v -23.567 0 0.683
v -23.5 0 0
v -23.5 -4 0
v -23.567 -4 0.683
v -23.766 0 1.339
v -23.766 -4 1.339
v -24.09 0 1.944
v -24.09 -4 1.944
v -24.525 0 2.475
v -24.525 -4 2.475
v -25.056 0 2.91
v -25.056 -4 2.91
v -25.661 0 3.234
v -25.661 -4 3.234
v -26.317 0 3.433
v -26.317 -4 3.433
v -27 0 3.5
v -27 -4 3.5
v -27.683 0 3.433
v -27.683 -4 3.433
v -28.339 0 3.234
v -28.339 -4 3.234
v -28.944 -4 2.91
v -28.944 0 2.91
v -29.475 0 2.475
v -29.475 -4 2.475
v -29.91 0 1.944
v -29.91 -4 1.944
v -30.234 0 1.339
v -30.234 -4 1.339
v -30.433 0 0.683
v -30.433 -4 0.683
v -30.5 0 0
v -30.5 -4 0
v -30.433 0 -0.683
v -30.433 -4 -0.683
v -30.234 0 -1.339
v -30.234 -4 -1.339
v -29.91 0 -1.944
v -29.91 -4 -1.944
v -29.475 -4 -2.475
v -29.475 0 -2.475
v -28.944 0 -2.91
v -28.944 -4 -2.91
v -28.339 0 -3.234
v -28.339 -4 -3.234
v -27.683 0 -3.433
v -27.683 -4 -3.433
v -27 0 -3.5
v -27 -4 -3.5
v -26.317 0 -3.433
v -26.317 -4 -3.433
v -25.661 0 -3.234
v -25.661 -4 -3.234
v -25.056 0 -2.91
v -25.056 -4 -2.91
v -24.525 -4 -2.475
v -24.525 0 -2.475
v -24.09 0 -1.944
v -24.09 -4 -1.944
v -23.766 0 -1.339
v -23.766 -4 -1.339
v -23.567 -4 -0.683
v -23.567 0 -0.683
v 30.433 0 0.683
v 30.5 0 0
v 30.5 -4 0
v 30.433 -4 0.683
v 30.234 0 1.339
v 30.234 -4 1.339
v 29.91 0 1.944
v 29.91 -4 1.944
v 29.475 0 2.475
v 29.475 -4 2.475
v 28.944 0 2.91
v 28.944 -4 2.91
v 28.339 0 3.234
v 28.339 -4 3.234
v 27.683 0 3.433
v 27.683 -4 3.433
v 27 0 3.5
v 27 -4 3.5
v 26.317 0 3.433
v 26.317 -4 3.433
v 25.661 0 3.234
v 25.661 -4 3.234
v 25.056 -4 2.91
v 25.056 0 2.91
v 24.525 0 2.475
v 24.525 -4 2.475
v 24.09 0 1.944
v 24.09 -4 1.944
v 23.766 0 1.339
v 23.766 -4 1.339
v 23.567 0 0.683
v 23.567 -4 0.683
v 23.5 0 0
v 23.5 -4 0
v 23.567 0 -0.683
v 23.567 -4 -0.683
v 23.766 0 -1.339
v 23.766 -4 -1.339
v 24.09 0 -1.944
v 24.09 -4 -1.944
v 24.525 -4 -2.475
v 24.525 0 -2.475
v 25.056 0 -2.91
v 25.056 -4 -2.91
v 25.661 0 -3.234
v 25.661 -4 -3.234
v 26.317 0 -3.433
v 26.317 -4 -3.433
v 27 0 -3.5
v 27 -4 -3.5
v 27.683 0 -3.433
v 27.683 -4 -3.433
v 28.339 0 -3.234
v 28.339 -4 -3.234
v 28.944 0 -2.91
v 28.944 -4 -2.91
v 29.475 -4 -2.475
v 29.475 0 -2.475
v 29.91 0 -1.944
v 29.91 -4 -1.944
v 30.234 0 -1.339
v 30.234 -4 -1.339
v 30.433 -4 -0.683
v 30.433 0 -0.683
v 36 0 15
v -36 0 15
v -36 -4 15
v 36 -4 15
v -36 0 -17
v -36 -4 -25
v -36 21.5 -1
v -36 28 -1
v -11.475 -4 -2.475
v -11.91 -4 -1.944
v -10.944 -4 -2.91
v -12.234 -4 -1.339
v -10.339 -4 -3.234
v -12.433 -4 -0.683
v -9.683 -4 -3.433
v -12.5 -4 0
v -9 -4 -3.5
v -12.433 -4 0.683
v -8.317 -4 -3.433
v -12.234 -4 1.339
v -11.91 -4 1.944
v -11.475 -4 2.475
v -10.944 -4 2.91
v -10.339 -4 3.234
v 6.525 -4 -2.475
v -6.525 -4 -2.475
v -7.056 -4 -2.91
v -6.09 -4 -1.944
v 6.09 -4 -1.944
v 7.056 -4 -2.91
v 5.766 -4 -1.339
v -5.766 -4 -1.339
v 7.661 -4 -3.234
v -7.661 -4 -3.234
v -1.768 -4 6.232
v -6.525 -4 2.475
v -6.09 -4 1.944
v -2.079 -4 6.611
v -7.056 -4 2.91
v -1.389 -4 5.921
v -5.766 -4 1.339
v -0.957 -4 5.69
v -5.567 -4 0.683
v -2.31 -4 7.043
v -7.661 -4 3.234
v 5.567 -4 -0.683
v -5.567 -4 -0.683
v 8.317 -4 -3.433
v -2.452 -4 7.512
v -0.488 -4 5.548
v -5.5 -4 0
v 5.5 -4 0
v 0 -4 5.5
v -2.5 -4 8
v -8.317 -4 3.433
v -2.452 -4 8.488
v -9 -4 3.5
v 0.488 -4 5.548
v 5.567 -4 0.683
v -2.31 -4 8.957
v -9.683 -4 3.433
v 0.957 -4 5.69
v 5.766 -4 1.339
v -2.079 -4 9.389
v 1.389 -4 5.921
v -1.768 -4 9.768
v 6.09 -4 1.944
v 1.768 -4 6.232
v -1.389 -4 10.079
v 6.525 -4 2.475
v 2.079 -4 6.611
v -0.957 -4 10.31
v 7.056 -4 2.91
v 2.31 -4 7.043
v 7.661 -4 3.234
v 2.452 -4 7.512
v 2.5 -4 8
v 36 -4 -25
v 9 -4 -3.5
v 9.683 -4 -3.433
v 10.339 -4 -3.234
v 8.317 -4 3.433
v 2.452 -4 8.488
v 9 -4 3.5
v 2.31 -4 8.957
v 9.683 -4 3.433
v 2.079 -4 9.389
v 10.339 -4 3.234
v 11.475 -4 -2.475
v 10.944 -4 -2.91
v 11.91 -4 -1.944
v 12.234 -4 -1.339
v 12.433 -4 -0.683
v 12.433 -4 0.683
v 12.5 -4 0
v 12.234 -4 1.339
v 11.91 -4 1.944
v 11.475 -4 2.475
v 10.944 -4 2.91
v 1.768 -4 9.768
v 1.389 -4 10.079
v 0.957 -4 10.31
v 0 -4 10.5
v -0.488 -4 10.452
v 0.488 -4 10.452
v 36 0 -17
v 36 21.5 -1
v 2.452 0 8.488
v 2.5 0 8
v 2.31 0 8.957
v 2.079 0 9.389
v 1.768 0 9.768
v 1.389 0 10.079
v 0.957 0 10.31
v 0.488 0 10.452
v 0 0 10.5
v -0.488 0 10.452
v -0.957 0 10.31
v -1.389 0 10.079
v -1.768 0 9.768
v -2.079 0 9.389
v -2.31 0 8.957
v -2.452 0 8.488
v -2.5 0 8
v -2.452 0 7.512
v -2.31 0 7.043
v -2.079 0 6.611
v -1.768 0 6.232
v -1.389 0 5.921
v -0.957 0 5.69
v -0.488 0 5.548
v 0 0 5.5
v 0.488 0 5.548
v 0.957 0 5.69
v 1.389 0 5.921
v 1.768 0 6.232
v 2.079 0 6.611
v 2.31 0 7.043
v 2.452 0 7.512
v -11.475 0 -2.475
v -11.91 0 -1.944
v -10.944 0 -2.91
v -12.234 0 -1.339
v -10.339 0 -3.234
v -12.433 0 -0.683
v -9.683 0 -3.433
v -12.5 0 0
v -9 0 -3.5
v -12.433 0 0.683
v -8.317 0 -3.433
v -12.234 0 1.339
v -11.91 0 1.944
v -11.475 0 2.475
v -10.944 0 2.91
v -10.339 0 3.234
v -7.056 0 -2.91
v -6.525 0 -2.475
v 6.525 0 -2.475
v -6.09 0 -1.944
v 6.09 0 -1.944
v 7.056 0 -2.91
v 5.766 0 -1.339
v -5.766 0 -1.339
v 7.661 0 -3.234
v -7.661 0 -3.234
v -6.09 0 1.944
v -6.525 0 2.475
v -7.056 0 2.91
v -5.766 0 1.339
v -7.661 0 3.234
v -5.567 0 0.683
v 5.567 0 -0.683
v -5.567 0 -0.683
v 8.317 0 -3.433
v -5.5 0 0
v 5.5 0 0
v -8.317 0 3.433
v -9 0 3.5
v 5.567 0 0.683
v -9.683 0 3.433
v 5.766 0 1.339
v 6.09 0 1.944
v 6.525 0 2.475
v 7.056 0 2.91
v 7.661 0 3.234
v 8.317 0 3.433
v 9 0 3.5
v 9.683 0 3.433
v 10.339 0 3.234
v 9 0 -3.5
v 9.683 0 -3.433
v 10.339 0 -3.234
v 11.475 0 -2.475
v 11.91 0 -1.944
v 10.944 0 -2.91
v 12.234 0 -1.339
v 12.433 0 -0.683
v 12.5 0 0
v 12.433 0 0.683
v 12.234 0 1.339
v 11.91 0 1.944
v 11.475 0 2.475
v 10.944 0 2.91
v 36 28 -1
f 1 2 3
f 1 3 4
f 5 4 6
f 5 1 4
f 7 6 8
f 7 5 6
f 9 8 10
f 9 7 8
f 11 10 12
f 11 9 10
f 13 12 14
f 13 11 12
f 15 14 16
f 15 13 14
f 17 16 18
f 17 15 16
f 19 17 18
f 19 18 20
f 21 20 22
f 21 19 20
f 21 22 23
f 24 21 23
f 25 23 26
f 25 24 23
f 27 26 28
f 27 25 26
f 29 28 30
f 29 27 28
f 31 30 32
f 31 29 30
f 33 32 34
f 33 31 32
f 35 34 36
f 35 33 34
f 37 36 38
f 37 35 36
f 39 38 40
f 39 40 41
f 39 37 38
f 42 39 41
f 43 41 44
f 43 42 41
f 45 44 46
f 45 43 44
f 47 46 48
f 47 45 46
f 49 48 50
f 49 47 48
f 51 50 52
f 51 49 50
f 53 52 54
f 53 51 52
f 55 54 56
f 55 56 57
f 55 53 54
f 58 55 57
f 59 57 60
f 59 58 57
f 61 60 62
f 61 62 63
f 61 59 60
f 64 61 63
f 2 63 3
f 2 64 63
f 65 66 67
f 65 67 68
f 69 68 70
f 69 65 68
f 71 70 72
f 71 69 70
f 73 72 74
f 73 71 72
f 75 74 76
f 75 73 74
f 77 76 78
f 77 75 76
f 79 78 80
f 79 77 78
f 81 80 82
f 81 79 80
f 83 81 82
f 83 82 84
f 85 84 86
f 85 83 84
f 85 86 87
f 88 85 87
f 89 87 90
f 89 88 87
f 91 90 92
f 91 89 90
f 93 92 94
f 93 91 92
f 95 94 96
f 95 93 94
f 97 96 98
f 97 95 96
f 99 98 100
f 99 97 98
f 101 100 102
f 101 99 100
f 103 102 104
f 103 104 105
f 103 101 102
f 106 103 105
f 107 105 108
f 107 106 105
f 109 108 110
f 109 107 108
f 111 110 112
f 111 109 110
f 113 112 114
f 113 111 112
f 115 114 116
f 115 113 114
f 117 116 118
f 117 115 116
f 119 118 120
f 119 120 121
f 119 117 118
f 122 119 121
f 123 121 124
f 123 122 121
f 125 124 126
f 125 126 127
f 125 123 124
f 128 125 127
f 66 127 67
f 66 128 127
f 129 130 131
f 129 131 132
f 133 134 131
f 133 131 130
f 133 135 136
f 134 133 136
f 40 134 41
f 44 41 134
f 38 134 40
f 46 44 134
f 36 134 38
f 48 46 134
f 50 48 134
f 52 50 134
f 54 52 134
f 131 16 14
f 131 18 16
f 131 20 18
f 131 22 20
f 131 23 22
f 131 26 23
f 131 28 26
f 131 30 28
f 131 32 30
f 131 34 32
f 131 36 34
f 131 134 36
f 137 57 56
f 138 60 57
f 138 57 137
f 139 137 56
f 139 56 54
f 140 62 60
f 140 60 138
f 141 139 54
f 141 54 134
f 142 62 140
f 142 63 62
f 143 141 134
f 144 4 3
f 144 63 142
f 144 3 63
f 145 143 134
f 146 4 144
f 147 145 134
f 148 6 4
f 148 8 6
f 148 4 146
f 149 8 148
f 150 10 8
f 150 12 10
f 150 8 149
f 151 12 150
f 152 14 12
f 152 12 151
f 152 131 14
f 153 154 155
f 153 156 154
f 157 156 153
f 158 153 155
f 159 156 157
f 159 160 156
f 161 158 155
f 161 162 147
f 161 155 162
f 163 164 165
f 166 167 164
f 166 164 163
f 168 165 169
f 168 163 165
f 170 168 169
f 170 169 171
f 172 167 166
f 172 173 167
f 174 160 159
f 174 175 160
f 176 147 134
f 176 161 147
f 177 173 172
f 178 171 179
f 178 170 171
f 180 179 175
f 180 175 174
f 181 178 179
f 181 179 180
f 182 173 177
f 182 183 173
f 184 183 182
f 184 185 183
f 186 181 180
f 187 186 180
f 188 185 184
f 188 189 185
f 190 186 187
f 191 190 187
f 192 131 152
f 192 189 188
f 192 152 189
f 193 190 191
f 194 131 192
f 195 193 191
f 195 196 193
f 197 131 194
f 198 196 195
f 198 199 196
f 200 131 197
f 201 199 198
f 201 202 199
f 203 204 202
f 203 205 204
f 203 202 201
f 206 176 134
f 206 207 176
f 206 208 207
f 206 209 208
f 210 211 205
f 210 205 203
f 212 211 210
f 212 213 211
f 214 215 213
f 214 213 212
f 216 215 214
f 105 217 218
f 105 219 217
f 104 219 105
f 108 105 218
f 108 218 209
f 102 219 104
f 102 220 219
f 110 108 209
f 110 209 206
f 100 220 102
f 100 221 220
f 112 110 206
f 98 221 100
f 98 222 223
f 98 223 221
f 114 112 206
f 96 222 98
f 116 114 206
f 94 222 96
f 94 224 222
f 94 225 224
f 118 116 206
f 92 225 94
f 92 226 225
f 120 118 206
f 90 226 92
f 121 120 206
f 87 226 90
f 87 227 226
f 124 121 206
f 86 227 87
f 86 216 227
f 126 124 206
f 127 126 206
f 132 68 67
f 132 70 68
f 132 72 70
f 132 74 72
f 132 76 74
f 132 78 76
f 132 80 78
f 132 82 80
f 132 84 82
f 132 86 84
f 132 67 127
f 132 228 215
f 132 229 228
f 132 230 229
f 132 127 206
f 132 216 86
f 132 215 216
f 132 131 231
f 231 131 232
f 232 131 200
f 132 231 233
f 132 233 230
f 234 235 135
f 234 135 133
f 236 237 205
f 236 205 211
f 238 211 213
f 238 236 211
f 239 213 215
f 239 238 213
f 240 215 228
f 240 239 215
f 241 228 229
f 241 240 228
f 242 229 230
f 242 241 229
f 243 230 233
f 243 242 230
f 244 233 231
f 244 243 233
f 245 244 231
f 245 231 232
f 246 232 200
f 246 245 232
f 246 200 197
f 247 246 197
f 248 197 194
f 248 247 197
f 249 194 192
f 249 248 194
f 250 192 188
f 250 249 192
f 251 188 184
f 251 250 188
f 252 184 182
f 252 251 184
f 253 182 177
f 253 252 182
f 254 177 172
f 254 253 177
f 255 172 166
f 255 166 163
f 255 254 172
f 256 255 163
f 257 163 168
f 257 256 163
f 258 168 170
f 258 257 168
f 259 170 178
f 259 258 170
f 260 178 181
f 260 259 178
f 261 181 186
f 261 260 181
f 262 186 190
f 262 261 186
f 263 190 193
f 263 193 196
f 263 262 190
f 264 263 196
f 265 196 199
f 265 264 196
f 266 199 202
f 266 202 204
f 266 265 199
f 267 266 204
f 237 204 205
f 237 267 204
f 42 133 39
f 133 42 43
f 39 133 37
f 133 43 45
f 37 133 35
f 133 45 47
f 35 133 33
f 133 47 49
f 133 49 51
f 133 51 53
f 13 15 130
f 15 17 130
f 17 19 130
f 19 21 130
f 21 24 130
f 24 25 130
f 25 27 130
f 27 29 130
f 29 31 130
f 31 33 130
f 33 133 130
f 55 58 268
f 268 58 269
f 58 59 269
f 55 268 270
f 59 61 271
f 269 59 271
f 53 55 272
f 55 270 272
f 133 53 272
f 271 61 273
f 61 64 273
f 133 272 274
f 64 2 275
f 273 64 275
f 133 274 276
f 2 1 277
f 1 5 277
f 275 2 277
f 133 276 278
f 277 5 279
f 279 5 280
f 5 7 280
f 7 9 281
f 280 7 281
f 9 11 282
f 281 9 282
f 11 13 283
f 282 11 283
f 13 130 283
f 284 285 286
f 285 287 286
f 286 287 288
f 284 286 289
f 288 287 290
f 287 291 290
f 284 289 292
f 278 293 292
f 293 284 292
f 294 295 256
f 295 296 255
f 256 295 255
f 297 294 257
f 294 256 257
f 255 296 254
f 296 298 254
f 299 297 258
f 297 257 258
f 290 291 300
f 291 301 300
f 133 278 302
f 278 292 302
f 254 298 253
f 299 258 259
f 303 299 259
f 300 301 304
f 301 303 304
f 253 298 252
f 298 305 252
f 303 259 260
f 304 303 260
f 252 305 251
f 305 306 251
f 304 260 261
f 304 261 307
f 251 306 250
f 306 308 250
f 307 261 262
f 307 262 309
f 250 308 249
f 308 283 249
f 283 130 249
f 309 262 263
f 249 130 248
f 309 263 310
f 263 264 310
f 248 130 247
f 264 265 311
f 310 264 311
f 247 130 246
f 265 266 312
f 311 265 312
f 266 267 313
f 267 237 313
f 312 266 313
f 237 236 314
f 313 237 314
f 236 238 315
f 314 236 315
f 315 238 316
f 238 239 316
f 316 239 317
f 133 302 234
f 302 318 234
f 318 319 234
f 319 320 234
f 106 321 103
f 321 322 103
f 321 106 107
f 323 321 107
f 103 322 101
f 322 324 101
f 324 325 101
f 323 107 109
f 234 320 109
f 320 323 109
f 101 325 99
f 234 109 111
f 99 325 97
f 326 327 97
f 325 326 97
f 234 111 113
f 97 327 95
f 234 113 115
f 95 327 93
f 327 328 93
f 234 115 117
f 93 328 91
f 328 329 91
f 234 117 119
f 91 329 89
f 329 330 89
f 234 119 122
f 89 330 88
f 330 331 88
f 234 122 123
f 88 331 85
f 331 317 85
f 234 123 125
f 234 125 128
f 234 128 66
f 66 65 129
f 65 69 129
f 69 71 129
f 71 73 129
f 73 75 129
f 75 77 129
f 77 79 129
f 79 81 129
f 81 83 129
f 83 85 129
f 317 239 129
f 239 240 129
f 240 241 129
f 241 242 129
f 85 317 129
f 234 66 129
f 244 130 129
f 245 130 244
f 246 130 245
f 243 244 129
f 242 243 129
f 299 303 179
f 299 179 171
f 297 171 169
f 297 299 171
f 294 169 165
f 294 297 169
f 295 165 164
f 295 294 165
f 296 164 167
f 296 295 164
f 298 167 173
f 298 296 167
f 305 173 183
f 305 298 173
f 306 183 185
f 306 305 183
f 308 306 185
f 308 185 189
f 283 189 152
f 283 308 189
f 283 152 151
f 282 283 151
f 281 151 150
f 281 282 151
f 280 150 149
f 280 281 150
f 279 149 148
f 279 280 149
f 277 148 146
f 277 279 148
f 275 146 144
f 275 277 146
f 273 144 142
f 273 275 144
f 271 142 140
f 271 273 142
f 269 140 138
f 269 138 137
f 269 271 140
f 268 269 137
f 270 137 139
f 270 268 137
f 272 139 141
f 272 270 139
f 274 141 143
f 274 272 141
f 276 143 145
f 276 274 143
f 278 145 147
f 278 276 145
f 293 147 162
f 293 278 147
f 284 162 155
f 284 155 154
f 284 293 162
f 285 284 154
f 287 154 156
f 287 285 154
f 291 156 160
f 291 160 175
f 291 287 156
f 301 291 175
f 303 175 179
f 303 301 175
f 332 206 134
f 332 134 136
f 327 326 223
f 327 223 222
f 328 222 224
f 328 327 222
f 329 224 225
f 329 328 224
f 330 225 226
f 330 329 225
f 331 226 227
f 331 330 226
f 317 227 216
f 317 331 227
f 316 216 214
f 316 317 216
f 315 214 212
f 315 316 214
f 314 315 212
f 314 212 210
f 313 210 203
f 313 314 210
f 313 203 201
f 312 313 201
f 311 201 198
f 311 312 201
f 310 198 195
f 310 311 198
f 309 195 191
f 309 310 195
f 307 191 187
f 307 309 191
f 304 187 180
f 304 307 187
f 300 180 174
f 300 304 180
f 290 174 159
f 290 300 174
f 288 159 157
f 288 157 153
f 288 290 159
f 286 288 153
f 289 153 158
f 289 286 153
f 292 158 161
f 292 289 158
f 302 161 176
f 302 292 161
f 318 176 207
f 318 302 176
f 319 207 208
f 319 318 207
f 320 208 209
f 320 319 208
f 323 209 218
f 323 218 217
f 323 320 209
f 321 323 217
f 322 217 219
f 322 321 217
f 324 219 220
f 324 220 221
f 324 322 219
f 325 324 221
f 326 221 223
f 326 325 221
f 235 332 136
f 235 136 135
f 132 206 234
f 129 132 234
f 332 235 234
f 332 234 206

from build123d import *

# Parameters (mm, degrees)
F0_W     = 72
F0_H     = 40
F0_R     = 3.5
F0_R_2   = 2.5
F1_DEPTH = 4
F3_DEPTH = 72
F5_DEPTH = 72


with BuildPart() as f1:
    # F0 (on Front) → F1 (new body)
    with BuildSketch(Plane.XZ):
        with Locations((0, -5)):
            Rectangle(F0_W, F0_H)
        with Locations((-27, 0)):
            Circle(F0_R, mode=Mode.SUBTRACT)
        with Locations((-9, 0)):
            Circle(F0_R, mode=Mode.SUBTRACT)
        with Locations((9, 0)):
            Circle(F0_R, mode=Mode.SUBTRACT)
        with Locations((27, 0)):
            Circle(F0_R, mode=Mode.SUBTRACT)
        with Locations((0, 8)):
            Circle(F0_R_2, mode=Mode.SUBTRACT)
    extrude(amount=F1_DEPTH)

    # F2 (on face) → F3 (cut)
    with BuildSketch(Plane.YZ.offset(36)):
        Polygon((0, -22), (-4, -25), (0, -25), align=None)
    extrude(amount=-F3_DEPTH, mode=Mode.SUBTRACT)

    # F4 (on face) → F5 (join)
    with BuildSketch(Plane.YZ.offset(36)):
        Polygon((0, -17), (0, -22), (28, -1), (21.5, -1), align=None)
    extrude(amount=-F5_DEPTH)


solid = f1.part
